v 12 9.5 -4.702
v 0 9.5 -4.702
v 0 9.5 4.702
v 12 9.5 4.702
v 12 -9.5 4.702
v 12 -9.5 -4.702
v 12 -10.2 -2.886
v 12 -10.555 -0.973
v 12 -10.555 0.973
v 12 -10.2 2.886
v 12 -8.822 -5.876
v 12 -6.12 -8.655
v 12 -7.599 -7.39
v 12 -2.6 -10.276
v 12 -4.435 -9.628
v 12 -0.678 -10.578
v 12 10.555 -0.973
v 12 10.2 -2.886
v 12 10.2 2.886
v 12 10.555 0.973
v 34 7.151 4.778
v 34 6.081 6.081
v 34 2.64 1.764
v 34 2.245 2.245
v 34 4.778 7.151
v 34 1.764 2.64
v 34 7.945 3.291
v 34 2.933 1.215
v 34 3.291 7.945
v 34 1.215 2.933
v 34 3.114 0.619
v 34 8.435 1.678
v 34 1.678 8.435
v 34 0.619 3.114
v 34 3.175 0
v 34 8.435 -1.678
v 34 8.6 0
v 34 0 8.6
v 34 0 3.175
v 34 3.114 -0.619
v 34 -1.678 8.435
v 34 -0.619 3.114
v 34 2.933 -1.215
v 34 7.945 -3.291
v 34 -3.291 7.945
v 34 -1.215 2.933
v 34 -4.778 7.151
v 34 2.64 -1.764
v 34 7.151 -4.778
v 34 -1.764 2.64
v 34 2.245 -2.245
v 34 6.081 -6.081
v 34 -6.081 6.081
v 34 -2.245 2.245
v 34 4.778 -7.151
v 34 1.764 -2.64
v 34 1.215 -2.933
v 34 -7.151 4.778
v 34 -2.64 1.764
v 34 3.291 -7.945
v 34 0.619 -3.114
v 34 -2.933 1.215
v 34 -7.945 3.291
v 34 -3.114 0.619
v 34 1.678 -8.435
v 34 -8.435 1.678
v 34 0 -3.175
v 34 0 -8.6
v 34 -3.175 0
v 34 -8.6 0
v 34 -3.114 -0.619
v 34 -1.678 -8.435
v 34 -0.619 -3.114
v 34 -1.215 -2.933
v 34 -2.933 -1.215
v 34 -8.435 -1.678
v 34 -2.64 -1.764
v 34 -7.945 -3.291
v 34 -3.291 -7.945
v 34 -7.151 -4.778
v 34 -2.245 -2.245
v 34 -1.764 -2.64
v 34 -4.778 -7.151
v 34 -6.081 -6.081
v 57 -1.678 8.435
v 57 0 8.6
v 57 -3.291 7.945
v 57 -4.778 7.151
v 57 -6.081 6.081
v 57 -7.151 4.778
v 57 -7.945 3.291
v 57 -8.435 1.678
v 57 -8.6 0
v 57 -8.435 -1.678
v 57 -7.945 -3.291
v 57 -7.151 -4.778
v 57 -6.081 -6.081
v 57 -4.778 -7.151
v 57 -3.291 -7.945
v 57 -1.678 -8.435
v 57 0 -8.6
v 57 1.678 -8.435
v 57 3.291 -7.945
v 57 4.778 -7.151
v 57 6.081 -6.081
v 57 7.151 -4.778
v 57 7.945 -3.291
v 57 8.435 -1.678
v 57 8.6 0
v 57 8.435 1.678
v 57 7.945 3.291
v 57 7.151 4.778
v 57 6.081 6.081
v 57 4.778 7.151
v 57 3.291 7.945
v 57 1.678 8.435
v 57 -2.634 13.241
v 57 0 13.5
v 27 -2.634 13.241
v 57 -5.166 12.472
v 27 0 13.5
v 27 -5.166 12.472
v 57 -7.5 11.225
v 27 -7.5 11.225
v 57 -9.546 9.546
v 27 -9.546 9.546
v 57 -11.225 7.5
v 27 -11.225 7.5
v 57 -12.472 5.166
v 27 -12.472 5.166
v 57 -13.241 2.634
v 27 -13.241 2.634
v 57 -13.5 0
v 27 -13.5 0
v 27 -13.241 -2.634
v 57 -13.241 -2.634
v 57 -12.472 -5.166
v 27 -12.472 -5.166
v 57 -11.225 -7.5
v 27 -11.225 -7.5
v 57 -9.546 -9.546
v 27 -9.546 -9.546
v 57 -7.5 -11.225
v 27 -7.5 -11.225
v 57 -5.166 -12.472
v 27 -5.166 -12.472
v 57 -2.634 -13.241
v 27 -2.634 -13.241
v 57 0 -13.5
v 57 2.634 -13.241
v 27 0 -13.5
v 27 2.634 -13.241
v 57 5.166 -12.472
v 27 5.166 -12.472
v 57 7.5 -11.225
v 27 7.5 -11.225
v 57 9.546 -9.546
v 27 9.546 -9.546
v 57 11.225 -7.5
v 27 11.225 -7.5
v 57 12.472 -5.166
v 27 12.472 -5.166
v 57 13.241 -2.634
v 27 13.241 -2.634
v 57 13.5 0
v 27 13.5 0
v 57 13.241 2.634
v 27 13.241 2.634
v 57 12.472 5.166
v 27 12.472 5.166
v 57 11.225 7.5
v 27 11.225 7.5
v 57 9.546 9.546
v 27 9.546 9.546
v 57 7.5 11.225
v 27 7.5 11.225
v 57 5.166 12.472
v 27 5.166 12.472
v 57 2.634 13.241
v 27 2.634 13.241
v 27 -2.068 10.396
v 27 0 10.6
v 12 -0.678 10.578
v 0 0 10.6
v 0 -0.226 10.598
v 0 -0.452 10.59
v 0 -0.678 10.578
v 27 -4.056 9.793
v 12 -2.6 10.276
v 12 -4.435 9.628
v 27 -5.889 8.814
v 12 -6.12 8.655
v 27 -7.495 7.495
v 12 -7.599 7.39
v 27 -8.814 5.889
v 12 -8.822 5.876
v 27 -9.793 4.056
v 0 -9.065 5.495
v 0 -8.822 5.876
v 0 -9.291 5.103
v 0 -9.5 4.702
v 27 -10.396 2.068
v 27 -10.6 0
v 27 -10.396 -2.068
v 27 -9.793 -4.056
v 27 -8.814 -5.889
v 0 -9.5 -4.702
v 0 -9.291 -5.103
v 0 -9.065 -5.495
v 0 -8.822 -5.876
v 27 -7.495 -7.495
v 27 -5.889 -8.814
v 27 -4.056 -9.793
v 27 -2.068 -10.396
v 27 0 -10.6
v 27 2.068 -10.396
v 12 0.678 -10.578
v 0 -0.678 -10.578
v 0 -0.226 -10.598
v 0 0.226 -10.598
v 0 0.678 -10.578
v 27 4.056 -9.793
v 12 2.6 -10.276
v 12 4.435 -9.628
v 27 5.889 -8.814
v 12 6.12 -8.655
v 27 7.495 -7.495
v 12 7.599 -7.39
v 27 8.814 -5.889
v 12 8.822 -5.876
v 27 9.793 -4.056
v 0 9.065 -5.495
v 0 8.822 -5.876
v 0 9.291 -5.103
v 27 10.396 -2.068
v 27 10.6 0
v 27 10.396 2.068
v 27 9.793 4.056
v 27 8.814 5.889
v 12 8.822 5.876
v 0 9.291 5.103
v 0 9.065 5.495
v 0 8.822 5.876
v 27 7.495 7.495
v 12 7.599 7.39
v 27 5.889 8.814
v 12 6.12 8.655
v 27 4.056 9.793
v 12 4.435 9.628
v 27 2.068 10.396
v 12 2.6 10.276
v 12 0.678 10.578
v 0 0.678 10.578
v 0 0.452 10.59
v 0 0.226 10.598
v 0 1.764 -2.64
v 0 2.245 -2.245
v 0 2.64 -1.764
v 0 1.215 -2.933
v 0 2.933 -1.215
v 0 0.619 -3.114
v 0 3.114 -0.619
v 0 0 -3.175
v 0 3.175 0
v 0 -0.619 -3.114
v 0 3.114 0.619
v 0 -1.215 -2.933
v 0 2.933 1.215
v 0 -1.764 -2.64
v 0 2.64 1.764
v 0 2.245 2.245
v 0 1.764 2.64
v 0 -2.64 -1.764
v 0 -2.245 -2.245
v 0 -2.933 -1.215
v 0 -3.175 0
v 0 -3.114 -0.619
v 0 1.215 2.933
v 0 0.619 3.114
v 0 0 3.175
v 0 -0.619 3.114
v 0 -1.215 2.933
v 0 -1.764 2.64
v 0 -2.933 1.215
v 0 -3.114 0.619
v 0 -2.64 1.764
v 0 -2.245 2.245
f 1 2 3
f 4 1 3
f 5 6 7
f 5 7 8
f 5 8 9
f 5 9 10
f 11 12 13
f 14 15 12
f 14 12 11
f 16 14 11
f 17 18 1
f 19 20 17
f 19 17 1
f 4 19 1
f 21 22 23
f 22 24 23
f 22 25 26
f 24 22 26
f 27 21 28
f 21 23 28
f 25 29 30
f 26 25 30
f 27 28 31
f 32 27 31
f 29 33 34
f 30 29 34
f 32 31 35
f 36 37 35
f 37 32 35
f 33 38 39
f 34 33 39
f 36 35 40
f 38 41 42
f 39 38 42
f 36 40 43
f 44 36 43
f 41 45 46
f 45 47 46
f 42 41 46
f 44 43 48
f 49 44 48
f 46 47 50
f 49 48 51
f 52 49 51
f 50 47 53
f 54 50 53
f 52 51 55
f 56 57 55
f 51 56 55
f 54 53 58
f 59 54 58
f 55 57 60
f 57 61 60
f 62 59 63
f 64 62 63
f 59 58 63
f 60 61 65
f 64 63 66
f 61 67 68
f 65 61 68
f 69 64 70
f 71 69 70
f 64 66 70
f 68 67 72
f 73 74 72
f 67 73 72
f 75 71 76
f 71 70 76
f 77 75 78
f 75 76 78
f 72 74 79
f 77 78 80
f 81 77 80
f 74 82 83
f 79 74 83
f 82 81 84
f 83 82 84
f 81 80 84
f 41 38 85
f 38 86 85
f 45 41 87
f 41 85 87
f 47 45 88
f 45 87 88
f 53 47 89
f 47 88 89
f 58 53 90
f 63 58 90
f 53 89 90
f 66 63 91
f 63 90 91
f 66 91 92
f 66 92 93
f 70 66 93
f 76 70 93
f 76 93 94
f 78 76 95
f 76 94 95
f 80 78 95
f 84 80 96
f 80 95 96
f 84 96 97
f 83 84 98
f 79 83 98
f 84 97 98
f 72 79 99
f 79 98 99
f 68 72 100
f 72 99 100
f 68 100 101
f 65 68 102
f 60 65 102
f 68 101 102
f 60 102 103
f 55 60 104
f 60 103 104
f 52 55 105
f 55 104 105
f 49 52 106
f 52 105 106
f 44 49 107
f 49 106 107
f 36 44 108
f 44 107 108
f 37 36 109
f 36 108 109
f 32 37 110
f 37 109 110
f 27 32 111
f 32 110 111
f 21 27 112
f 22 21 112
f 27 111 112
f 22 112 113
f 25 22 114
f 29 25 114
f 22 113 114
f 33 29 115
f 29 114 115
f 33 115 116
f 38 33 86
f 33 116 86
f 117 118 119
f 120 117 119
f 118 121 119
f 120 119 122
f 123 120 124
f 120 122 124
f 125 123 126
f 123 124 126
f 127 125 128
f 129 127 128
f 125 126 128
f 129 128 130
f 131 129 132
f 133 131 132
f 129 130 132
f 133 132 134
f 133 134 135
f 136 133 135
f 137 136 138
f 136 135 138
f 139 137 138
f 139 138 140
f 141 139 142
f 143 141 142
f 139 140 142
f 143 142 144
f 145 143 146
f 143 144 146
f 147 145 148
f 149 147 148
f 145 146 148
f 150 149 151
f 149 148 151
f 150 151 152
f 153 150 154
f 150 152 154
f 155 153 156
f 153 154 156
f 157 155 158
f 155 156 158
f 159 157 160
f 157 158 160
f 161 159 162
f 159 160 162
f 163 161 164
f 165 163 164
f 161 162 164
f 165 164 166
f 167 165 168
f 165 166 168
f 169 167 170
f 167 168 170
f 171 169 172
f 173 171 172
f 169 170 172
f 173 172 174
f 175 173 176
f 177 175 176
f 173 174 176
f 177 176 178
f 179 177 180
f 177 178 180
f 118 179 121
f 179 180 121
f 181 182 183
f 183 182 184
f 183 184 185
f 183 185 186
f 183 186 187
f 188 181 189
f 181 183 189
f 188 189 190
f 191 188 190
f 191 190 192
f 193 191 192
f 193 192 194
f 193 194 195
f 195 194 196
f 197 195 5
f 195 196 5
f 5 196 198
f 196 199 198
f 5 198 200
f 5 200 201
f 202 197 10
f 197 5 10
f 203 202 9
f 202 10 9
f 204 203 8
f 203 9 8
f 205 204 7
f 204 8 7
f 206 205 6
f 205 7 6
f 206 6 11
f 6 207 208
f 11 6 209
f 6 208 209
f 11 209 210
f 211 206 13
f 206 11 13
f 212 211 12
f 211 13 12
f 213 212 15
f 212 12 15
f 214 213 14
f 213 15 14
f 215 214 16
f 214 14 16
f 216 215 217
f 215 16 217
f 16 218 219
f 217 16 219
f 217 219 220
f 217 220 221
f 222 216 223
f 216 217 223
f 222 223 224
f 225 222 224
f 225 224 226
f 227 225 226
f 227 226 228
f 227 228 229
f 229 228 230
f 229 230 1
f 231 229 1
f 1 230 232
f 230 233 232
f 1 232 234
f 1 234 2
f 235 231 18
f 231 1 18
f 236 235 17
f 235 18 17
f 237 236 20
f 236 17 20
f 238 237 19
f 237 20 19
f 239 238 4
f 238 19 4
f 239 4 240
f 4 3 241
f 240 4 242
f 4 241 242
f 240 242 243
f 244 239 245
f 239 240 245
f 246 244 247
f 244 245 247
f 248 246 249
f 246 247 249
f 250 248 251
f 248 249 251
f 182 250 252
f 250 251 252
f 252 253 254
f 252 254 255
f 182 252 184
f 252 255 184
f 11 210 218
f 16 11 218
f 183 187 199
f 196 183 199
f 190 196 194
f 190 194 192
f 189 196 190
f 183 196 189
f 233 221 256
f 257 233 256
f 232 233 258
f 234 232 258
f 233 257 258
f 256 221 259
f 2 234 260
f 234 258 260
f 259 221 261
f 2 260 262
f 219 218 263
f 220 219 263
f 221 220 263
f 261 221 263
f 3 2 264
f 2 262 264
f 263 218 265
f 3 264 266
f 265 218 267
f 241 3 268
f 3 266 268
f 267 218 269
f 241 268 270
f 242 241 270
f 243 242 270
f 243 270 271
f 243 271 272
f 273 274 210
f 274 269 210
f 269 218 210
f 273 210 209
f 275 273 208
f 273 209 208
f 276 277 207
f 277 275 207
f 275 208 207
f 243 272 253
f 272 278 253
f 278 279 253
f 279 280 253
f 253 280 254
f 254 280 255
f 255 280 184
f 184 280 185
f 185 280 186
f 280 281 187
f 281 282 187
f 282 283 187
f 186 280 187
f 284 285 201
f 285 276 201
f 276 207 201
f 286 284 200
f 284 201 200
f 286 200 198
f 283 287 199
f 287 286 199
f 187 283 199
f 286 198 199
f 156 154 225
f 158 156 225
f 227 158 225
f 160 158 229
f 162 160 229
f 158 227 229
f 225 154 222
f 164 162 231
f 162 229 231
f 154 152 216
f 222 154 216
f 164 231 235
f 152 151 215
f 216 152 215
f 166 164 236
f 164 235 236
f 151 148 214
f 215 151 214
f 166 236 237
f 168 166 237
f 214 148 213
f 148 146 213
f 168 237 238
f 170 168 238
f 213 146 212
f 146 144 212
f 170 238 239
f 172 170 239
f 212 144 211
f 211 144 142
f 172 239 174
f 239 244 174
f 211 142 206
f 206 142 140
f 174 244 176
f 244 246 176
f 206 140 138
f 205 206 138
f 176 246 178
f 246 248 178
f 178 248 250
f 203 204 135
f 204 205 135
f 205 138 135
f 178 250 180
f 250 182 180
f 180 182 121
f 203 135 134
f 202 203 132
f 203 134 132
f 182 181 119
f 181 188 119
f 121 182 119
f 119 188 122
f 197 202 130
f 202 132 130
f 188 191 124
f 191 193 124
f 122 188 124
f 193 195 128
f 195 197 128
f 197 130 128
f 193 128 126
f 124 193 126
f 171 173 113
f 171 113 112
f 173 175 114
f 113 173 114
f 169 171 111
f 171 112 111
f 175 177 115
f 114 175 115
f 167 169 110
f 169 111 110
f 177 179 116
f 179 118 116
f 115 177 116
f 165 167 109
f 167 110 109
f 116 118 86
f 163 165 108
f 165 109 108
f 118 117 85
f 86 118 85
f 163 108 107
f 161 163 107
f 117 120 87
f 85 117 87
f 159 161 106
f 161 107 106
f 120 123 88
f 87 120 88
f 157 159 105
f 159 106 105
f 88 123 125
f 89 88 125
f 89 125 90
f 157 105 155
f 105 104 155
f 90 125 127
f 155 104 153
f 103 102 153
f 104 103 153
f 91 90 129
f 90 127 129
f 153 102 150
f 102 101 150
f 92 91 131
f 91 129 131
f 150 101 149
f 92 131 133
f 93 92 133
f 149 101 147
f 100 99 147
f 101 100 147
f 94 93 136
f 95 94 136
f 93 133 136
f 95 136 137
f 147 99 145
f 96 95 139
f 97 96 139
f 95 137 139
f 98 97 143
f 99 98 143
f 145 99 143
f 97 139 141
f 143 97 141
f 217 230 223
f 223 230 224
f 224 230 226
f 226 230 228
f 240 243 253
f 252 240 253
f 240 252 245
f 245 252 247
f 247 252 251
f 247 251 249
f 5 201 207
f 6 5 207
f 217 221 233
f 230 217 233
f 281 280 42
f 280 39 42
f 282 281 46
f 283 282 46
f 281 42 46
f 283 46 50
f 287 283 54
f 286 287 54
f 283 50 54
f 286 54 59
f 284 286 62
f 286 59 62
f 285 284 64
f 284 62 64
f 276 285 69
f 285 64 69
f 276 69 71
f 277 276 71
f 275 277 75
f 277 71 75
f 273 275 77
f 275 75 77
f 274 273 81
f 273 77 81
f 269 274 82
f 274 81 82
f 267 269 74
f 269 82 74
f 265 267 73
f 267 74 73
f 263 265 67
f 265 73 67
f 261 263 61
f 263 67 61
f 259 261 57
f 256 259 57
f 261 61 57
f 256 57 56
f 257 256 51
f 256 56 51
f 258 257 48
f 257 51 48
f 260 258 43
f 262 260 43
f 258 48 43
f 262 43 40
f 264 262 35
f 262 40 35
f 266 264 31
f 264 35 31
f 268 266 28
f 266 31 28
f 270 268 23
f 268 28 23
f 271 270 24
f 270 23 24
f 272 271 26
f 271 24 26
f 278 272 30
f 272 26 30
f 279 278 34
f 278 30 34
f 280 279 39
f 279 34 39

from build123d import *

# Parameters (mm, degrees)
CUT_EXTRUDE2_DEPTH = 12


with BuildPart() as part:
    # Sketch1 → Revolve1 (revolve)
    with BuildSketch(Plane.XY, mode=Mode.PRIVATE) as revolve1_sk:
        Polygon((57, -13.5), (27, -13.5), (27, -10.6), (0, -10.6), (0, -3.175), (34, -3.175), (34, -8.6), (57, -8.6), align=None)
    revolve(revolve1_sk.sketch.rotate(Axis((0, 0, 0), (1, 0, 0)), 270), axis=Axis((0, 0, 0), (1, 0, 0)))

    # Sketch2 → Cut-Extrude2 (cut)
    with BuildSketch(Plane.ZY):
        with BuildLine():
            Line((-10.578304925, 0.677838412), (-5.876177747, 8.822161588))
            ThreePointArc((-5.876177747, 8.822161588), (-9.17986928, 5.3), (-10.578304925, 0.677838412))
        make_face()
        with BuildLine():
            ThreePointArc((4.702127178, 9.5), (0, 10.6), (-4.702127178, 9.5))
            Line((-4.702127178, 9.5), (4.702127178, 9.5))
        make_face()
        with BuildLine():
            Line((-5.876177747, -8.822161588), (-10.578304925, -0.677838412))
            ThreePointArc((-10.578304925, -0.677838412), (-9.17986928, -5.3), (-5.876177747, -8.822161588))
        make_face()
        with BuildLine():
            ThreePointArc((10.578304925, 0.677838412), (9.17986928, 5.3), (5.876177747, 8.822161588))
            Line((5.876177747, 8.822161588), (10.578304925, 0.677838412))
        make_face()
        with BuildLine():
            Line((4.702127178, -9.5), (-4.702127178, -9.5))
            ThreePointArc((-4.702127178, -9.5), (0, -10.6), (4.702127178, -9.5))
        make_face()
        with BuildLine():
            ThreePointArc((5.876177747, -8.822161588), (9.17986928, -5.3), (10.578304925, -0.677838412))
            Line((10.578304925, -0.677838412), (5.876177747, -8.822161588))
        make_face()
    extrude(amount=-CUT_EXTRUDE2_DEPTH, mode=Mode.SUBTRACT)


solid = part.part
